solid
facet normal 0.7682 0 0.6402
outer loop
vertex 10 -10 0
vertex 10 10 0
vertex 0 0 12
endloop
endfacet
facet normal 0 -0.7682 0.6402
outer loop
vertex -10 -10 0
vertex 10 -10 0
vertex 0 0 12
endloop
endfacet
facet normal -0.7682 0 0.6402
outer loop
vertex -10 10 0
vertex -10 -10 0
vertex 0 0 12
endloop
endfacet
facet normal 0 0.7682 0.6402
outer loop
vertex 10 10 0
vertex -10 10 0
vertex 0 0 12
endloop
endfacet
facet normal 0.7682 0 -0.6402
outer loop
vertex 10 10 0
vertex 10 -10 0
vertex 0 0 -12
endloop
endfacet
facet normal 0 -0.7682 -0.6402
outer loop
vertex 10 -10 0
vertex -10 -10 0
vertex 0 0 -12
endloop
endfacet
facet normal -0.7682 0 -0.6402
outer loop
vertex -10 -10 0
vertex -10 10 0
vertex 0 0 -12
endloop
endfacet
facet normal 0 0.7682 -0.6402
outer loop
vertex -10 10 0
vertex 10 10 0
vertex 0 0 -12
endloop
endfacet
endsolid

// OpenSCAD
base_size = 20;
height = 12;
center_at_origin = true;
hollow = false;
wall_thickness = 1.0;
resolution = 16;

outer_points = [
    [0, 0, height],
    [base_size/2, base_size/2, 0],
    [base_size/2, -base_size/2, 0],
    [-base_size/2, -base_size/2, 0],
    [-base_size/2, base_size/2, 0],
    [0, 0, -height]
];

outer_faces = [
    [0,1,2],
    [0,2,3],
    [0,3,4],
    [0,4,1],
    [5,2,1],
    [5,3,2],
    [5,4,3],
    [5,1,4]
];

outer_max_radius = max(abs(height), sqrt(pow(base_size/2, 2) + pow(base_size/2, 2)));
inner_scale = max(0, 1 - wall_thickness / outer_max_radius);

inner_points = [
    [outer_points[0][0] * inner_scale, outer_points[0][1] * inner_scale, outer_points[0][2] * inner_scale],
    [outer_points[1][0] * inner_scale, outer_points[1][1] * inner_scale, outer_points[1][2] * inner_scale],
    [outer_points[2][0] * inner_scale, outer_points[2][1] * inner_scale, outer_points[2][2] * inner_scale],
    [outer_points[3][0] * inner_scale, outer_points[3][1] * inner_scale, outer_points[3][2] * inner_scale],
    [outer_points[4][0] * inner_scale, outer_points[4][1] * inner_scale, outer_points[4][2] * inner_scale],
    [outer_points[5][0] * inner_scale, outer_points[5][1] * inner_scale, outer_points[5][2] * inner_scale]
];

inner_faces = [
    [0,2,1],
    [0,3,2],
    [0,4,3],
    [0,1,4],
    [5,1,2],
    [5,2,3],
    [5,3,4],
    [5,4,1]
];

if (center_at_origin) {
    if (hollow) {
        difference() {
            union() {
                polyhedron(points=outer_points, faces=outer_faces, convexity=2);
            }
            polyhedron(points=inner_points, faces=inner_faces, convexity=2);
        }
    } else {
        union() {
            polyhedron(points=outer_points, faces=outer_faces, convexity=2);
        }
    }
} else {
    translate([0, 0, height]) {
        if (hollow) {
            difference() {
                union() {
                    polyhedron(points=outer_points, faces=outer_faces, convexity=2);
                }
                polyhedron(points=inner_points, faces=inner_faces, convexity=2);
            }
        } else {
            union() {
                polyhedron(points=outer_points, faces=outer_faces, convexity=2);
            }
        }
    }
}
